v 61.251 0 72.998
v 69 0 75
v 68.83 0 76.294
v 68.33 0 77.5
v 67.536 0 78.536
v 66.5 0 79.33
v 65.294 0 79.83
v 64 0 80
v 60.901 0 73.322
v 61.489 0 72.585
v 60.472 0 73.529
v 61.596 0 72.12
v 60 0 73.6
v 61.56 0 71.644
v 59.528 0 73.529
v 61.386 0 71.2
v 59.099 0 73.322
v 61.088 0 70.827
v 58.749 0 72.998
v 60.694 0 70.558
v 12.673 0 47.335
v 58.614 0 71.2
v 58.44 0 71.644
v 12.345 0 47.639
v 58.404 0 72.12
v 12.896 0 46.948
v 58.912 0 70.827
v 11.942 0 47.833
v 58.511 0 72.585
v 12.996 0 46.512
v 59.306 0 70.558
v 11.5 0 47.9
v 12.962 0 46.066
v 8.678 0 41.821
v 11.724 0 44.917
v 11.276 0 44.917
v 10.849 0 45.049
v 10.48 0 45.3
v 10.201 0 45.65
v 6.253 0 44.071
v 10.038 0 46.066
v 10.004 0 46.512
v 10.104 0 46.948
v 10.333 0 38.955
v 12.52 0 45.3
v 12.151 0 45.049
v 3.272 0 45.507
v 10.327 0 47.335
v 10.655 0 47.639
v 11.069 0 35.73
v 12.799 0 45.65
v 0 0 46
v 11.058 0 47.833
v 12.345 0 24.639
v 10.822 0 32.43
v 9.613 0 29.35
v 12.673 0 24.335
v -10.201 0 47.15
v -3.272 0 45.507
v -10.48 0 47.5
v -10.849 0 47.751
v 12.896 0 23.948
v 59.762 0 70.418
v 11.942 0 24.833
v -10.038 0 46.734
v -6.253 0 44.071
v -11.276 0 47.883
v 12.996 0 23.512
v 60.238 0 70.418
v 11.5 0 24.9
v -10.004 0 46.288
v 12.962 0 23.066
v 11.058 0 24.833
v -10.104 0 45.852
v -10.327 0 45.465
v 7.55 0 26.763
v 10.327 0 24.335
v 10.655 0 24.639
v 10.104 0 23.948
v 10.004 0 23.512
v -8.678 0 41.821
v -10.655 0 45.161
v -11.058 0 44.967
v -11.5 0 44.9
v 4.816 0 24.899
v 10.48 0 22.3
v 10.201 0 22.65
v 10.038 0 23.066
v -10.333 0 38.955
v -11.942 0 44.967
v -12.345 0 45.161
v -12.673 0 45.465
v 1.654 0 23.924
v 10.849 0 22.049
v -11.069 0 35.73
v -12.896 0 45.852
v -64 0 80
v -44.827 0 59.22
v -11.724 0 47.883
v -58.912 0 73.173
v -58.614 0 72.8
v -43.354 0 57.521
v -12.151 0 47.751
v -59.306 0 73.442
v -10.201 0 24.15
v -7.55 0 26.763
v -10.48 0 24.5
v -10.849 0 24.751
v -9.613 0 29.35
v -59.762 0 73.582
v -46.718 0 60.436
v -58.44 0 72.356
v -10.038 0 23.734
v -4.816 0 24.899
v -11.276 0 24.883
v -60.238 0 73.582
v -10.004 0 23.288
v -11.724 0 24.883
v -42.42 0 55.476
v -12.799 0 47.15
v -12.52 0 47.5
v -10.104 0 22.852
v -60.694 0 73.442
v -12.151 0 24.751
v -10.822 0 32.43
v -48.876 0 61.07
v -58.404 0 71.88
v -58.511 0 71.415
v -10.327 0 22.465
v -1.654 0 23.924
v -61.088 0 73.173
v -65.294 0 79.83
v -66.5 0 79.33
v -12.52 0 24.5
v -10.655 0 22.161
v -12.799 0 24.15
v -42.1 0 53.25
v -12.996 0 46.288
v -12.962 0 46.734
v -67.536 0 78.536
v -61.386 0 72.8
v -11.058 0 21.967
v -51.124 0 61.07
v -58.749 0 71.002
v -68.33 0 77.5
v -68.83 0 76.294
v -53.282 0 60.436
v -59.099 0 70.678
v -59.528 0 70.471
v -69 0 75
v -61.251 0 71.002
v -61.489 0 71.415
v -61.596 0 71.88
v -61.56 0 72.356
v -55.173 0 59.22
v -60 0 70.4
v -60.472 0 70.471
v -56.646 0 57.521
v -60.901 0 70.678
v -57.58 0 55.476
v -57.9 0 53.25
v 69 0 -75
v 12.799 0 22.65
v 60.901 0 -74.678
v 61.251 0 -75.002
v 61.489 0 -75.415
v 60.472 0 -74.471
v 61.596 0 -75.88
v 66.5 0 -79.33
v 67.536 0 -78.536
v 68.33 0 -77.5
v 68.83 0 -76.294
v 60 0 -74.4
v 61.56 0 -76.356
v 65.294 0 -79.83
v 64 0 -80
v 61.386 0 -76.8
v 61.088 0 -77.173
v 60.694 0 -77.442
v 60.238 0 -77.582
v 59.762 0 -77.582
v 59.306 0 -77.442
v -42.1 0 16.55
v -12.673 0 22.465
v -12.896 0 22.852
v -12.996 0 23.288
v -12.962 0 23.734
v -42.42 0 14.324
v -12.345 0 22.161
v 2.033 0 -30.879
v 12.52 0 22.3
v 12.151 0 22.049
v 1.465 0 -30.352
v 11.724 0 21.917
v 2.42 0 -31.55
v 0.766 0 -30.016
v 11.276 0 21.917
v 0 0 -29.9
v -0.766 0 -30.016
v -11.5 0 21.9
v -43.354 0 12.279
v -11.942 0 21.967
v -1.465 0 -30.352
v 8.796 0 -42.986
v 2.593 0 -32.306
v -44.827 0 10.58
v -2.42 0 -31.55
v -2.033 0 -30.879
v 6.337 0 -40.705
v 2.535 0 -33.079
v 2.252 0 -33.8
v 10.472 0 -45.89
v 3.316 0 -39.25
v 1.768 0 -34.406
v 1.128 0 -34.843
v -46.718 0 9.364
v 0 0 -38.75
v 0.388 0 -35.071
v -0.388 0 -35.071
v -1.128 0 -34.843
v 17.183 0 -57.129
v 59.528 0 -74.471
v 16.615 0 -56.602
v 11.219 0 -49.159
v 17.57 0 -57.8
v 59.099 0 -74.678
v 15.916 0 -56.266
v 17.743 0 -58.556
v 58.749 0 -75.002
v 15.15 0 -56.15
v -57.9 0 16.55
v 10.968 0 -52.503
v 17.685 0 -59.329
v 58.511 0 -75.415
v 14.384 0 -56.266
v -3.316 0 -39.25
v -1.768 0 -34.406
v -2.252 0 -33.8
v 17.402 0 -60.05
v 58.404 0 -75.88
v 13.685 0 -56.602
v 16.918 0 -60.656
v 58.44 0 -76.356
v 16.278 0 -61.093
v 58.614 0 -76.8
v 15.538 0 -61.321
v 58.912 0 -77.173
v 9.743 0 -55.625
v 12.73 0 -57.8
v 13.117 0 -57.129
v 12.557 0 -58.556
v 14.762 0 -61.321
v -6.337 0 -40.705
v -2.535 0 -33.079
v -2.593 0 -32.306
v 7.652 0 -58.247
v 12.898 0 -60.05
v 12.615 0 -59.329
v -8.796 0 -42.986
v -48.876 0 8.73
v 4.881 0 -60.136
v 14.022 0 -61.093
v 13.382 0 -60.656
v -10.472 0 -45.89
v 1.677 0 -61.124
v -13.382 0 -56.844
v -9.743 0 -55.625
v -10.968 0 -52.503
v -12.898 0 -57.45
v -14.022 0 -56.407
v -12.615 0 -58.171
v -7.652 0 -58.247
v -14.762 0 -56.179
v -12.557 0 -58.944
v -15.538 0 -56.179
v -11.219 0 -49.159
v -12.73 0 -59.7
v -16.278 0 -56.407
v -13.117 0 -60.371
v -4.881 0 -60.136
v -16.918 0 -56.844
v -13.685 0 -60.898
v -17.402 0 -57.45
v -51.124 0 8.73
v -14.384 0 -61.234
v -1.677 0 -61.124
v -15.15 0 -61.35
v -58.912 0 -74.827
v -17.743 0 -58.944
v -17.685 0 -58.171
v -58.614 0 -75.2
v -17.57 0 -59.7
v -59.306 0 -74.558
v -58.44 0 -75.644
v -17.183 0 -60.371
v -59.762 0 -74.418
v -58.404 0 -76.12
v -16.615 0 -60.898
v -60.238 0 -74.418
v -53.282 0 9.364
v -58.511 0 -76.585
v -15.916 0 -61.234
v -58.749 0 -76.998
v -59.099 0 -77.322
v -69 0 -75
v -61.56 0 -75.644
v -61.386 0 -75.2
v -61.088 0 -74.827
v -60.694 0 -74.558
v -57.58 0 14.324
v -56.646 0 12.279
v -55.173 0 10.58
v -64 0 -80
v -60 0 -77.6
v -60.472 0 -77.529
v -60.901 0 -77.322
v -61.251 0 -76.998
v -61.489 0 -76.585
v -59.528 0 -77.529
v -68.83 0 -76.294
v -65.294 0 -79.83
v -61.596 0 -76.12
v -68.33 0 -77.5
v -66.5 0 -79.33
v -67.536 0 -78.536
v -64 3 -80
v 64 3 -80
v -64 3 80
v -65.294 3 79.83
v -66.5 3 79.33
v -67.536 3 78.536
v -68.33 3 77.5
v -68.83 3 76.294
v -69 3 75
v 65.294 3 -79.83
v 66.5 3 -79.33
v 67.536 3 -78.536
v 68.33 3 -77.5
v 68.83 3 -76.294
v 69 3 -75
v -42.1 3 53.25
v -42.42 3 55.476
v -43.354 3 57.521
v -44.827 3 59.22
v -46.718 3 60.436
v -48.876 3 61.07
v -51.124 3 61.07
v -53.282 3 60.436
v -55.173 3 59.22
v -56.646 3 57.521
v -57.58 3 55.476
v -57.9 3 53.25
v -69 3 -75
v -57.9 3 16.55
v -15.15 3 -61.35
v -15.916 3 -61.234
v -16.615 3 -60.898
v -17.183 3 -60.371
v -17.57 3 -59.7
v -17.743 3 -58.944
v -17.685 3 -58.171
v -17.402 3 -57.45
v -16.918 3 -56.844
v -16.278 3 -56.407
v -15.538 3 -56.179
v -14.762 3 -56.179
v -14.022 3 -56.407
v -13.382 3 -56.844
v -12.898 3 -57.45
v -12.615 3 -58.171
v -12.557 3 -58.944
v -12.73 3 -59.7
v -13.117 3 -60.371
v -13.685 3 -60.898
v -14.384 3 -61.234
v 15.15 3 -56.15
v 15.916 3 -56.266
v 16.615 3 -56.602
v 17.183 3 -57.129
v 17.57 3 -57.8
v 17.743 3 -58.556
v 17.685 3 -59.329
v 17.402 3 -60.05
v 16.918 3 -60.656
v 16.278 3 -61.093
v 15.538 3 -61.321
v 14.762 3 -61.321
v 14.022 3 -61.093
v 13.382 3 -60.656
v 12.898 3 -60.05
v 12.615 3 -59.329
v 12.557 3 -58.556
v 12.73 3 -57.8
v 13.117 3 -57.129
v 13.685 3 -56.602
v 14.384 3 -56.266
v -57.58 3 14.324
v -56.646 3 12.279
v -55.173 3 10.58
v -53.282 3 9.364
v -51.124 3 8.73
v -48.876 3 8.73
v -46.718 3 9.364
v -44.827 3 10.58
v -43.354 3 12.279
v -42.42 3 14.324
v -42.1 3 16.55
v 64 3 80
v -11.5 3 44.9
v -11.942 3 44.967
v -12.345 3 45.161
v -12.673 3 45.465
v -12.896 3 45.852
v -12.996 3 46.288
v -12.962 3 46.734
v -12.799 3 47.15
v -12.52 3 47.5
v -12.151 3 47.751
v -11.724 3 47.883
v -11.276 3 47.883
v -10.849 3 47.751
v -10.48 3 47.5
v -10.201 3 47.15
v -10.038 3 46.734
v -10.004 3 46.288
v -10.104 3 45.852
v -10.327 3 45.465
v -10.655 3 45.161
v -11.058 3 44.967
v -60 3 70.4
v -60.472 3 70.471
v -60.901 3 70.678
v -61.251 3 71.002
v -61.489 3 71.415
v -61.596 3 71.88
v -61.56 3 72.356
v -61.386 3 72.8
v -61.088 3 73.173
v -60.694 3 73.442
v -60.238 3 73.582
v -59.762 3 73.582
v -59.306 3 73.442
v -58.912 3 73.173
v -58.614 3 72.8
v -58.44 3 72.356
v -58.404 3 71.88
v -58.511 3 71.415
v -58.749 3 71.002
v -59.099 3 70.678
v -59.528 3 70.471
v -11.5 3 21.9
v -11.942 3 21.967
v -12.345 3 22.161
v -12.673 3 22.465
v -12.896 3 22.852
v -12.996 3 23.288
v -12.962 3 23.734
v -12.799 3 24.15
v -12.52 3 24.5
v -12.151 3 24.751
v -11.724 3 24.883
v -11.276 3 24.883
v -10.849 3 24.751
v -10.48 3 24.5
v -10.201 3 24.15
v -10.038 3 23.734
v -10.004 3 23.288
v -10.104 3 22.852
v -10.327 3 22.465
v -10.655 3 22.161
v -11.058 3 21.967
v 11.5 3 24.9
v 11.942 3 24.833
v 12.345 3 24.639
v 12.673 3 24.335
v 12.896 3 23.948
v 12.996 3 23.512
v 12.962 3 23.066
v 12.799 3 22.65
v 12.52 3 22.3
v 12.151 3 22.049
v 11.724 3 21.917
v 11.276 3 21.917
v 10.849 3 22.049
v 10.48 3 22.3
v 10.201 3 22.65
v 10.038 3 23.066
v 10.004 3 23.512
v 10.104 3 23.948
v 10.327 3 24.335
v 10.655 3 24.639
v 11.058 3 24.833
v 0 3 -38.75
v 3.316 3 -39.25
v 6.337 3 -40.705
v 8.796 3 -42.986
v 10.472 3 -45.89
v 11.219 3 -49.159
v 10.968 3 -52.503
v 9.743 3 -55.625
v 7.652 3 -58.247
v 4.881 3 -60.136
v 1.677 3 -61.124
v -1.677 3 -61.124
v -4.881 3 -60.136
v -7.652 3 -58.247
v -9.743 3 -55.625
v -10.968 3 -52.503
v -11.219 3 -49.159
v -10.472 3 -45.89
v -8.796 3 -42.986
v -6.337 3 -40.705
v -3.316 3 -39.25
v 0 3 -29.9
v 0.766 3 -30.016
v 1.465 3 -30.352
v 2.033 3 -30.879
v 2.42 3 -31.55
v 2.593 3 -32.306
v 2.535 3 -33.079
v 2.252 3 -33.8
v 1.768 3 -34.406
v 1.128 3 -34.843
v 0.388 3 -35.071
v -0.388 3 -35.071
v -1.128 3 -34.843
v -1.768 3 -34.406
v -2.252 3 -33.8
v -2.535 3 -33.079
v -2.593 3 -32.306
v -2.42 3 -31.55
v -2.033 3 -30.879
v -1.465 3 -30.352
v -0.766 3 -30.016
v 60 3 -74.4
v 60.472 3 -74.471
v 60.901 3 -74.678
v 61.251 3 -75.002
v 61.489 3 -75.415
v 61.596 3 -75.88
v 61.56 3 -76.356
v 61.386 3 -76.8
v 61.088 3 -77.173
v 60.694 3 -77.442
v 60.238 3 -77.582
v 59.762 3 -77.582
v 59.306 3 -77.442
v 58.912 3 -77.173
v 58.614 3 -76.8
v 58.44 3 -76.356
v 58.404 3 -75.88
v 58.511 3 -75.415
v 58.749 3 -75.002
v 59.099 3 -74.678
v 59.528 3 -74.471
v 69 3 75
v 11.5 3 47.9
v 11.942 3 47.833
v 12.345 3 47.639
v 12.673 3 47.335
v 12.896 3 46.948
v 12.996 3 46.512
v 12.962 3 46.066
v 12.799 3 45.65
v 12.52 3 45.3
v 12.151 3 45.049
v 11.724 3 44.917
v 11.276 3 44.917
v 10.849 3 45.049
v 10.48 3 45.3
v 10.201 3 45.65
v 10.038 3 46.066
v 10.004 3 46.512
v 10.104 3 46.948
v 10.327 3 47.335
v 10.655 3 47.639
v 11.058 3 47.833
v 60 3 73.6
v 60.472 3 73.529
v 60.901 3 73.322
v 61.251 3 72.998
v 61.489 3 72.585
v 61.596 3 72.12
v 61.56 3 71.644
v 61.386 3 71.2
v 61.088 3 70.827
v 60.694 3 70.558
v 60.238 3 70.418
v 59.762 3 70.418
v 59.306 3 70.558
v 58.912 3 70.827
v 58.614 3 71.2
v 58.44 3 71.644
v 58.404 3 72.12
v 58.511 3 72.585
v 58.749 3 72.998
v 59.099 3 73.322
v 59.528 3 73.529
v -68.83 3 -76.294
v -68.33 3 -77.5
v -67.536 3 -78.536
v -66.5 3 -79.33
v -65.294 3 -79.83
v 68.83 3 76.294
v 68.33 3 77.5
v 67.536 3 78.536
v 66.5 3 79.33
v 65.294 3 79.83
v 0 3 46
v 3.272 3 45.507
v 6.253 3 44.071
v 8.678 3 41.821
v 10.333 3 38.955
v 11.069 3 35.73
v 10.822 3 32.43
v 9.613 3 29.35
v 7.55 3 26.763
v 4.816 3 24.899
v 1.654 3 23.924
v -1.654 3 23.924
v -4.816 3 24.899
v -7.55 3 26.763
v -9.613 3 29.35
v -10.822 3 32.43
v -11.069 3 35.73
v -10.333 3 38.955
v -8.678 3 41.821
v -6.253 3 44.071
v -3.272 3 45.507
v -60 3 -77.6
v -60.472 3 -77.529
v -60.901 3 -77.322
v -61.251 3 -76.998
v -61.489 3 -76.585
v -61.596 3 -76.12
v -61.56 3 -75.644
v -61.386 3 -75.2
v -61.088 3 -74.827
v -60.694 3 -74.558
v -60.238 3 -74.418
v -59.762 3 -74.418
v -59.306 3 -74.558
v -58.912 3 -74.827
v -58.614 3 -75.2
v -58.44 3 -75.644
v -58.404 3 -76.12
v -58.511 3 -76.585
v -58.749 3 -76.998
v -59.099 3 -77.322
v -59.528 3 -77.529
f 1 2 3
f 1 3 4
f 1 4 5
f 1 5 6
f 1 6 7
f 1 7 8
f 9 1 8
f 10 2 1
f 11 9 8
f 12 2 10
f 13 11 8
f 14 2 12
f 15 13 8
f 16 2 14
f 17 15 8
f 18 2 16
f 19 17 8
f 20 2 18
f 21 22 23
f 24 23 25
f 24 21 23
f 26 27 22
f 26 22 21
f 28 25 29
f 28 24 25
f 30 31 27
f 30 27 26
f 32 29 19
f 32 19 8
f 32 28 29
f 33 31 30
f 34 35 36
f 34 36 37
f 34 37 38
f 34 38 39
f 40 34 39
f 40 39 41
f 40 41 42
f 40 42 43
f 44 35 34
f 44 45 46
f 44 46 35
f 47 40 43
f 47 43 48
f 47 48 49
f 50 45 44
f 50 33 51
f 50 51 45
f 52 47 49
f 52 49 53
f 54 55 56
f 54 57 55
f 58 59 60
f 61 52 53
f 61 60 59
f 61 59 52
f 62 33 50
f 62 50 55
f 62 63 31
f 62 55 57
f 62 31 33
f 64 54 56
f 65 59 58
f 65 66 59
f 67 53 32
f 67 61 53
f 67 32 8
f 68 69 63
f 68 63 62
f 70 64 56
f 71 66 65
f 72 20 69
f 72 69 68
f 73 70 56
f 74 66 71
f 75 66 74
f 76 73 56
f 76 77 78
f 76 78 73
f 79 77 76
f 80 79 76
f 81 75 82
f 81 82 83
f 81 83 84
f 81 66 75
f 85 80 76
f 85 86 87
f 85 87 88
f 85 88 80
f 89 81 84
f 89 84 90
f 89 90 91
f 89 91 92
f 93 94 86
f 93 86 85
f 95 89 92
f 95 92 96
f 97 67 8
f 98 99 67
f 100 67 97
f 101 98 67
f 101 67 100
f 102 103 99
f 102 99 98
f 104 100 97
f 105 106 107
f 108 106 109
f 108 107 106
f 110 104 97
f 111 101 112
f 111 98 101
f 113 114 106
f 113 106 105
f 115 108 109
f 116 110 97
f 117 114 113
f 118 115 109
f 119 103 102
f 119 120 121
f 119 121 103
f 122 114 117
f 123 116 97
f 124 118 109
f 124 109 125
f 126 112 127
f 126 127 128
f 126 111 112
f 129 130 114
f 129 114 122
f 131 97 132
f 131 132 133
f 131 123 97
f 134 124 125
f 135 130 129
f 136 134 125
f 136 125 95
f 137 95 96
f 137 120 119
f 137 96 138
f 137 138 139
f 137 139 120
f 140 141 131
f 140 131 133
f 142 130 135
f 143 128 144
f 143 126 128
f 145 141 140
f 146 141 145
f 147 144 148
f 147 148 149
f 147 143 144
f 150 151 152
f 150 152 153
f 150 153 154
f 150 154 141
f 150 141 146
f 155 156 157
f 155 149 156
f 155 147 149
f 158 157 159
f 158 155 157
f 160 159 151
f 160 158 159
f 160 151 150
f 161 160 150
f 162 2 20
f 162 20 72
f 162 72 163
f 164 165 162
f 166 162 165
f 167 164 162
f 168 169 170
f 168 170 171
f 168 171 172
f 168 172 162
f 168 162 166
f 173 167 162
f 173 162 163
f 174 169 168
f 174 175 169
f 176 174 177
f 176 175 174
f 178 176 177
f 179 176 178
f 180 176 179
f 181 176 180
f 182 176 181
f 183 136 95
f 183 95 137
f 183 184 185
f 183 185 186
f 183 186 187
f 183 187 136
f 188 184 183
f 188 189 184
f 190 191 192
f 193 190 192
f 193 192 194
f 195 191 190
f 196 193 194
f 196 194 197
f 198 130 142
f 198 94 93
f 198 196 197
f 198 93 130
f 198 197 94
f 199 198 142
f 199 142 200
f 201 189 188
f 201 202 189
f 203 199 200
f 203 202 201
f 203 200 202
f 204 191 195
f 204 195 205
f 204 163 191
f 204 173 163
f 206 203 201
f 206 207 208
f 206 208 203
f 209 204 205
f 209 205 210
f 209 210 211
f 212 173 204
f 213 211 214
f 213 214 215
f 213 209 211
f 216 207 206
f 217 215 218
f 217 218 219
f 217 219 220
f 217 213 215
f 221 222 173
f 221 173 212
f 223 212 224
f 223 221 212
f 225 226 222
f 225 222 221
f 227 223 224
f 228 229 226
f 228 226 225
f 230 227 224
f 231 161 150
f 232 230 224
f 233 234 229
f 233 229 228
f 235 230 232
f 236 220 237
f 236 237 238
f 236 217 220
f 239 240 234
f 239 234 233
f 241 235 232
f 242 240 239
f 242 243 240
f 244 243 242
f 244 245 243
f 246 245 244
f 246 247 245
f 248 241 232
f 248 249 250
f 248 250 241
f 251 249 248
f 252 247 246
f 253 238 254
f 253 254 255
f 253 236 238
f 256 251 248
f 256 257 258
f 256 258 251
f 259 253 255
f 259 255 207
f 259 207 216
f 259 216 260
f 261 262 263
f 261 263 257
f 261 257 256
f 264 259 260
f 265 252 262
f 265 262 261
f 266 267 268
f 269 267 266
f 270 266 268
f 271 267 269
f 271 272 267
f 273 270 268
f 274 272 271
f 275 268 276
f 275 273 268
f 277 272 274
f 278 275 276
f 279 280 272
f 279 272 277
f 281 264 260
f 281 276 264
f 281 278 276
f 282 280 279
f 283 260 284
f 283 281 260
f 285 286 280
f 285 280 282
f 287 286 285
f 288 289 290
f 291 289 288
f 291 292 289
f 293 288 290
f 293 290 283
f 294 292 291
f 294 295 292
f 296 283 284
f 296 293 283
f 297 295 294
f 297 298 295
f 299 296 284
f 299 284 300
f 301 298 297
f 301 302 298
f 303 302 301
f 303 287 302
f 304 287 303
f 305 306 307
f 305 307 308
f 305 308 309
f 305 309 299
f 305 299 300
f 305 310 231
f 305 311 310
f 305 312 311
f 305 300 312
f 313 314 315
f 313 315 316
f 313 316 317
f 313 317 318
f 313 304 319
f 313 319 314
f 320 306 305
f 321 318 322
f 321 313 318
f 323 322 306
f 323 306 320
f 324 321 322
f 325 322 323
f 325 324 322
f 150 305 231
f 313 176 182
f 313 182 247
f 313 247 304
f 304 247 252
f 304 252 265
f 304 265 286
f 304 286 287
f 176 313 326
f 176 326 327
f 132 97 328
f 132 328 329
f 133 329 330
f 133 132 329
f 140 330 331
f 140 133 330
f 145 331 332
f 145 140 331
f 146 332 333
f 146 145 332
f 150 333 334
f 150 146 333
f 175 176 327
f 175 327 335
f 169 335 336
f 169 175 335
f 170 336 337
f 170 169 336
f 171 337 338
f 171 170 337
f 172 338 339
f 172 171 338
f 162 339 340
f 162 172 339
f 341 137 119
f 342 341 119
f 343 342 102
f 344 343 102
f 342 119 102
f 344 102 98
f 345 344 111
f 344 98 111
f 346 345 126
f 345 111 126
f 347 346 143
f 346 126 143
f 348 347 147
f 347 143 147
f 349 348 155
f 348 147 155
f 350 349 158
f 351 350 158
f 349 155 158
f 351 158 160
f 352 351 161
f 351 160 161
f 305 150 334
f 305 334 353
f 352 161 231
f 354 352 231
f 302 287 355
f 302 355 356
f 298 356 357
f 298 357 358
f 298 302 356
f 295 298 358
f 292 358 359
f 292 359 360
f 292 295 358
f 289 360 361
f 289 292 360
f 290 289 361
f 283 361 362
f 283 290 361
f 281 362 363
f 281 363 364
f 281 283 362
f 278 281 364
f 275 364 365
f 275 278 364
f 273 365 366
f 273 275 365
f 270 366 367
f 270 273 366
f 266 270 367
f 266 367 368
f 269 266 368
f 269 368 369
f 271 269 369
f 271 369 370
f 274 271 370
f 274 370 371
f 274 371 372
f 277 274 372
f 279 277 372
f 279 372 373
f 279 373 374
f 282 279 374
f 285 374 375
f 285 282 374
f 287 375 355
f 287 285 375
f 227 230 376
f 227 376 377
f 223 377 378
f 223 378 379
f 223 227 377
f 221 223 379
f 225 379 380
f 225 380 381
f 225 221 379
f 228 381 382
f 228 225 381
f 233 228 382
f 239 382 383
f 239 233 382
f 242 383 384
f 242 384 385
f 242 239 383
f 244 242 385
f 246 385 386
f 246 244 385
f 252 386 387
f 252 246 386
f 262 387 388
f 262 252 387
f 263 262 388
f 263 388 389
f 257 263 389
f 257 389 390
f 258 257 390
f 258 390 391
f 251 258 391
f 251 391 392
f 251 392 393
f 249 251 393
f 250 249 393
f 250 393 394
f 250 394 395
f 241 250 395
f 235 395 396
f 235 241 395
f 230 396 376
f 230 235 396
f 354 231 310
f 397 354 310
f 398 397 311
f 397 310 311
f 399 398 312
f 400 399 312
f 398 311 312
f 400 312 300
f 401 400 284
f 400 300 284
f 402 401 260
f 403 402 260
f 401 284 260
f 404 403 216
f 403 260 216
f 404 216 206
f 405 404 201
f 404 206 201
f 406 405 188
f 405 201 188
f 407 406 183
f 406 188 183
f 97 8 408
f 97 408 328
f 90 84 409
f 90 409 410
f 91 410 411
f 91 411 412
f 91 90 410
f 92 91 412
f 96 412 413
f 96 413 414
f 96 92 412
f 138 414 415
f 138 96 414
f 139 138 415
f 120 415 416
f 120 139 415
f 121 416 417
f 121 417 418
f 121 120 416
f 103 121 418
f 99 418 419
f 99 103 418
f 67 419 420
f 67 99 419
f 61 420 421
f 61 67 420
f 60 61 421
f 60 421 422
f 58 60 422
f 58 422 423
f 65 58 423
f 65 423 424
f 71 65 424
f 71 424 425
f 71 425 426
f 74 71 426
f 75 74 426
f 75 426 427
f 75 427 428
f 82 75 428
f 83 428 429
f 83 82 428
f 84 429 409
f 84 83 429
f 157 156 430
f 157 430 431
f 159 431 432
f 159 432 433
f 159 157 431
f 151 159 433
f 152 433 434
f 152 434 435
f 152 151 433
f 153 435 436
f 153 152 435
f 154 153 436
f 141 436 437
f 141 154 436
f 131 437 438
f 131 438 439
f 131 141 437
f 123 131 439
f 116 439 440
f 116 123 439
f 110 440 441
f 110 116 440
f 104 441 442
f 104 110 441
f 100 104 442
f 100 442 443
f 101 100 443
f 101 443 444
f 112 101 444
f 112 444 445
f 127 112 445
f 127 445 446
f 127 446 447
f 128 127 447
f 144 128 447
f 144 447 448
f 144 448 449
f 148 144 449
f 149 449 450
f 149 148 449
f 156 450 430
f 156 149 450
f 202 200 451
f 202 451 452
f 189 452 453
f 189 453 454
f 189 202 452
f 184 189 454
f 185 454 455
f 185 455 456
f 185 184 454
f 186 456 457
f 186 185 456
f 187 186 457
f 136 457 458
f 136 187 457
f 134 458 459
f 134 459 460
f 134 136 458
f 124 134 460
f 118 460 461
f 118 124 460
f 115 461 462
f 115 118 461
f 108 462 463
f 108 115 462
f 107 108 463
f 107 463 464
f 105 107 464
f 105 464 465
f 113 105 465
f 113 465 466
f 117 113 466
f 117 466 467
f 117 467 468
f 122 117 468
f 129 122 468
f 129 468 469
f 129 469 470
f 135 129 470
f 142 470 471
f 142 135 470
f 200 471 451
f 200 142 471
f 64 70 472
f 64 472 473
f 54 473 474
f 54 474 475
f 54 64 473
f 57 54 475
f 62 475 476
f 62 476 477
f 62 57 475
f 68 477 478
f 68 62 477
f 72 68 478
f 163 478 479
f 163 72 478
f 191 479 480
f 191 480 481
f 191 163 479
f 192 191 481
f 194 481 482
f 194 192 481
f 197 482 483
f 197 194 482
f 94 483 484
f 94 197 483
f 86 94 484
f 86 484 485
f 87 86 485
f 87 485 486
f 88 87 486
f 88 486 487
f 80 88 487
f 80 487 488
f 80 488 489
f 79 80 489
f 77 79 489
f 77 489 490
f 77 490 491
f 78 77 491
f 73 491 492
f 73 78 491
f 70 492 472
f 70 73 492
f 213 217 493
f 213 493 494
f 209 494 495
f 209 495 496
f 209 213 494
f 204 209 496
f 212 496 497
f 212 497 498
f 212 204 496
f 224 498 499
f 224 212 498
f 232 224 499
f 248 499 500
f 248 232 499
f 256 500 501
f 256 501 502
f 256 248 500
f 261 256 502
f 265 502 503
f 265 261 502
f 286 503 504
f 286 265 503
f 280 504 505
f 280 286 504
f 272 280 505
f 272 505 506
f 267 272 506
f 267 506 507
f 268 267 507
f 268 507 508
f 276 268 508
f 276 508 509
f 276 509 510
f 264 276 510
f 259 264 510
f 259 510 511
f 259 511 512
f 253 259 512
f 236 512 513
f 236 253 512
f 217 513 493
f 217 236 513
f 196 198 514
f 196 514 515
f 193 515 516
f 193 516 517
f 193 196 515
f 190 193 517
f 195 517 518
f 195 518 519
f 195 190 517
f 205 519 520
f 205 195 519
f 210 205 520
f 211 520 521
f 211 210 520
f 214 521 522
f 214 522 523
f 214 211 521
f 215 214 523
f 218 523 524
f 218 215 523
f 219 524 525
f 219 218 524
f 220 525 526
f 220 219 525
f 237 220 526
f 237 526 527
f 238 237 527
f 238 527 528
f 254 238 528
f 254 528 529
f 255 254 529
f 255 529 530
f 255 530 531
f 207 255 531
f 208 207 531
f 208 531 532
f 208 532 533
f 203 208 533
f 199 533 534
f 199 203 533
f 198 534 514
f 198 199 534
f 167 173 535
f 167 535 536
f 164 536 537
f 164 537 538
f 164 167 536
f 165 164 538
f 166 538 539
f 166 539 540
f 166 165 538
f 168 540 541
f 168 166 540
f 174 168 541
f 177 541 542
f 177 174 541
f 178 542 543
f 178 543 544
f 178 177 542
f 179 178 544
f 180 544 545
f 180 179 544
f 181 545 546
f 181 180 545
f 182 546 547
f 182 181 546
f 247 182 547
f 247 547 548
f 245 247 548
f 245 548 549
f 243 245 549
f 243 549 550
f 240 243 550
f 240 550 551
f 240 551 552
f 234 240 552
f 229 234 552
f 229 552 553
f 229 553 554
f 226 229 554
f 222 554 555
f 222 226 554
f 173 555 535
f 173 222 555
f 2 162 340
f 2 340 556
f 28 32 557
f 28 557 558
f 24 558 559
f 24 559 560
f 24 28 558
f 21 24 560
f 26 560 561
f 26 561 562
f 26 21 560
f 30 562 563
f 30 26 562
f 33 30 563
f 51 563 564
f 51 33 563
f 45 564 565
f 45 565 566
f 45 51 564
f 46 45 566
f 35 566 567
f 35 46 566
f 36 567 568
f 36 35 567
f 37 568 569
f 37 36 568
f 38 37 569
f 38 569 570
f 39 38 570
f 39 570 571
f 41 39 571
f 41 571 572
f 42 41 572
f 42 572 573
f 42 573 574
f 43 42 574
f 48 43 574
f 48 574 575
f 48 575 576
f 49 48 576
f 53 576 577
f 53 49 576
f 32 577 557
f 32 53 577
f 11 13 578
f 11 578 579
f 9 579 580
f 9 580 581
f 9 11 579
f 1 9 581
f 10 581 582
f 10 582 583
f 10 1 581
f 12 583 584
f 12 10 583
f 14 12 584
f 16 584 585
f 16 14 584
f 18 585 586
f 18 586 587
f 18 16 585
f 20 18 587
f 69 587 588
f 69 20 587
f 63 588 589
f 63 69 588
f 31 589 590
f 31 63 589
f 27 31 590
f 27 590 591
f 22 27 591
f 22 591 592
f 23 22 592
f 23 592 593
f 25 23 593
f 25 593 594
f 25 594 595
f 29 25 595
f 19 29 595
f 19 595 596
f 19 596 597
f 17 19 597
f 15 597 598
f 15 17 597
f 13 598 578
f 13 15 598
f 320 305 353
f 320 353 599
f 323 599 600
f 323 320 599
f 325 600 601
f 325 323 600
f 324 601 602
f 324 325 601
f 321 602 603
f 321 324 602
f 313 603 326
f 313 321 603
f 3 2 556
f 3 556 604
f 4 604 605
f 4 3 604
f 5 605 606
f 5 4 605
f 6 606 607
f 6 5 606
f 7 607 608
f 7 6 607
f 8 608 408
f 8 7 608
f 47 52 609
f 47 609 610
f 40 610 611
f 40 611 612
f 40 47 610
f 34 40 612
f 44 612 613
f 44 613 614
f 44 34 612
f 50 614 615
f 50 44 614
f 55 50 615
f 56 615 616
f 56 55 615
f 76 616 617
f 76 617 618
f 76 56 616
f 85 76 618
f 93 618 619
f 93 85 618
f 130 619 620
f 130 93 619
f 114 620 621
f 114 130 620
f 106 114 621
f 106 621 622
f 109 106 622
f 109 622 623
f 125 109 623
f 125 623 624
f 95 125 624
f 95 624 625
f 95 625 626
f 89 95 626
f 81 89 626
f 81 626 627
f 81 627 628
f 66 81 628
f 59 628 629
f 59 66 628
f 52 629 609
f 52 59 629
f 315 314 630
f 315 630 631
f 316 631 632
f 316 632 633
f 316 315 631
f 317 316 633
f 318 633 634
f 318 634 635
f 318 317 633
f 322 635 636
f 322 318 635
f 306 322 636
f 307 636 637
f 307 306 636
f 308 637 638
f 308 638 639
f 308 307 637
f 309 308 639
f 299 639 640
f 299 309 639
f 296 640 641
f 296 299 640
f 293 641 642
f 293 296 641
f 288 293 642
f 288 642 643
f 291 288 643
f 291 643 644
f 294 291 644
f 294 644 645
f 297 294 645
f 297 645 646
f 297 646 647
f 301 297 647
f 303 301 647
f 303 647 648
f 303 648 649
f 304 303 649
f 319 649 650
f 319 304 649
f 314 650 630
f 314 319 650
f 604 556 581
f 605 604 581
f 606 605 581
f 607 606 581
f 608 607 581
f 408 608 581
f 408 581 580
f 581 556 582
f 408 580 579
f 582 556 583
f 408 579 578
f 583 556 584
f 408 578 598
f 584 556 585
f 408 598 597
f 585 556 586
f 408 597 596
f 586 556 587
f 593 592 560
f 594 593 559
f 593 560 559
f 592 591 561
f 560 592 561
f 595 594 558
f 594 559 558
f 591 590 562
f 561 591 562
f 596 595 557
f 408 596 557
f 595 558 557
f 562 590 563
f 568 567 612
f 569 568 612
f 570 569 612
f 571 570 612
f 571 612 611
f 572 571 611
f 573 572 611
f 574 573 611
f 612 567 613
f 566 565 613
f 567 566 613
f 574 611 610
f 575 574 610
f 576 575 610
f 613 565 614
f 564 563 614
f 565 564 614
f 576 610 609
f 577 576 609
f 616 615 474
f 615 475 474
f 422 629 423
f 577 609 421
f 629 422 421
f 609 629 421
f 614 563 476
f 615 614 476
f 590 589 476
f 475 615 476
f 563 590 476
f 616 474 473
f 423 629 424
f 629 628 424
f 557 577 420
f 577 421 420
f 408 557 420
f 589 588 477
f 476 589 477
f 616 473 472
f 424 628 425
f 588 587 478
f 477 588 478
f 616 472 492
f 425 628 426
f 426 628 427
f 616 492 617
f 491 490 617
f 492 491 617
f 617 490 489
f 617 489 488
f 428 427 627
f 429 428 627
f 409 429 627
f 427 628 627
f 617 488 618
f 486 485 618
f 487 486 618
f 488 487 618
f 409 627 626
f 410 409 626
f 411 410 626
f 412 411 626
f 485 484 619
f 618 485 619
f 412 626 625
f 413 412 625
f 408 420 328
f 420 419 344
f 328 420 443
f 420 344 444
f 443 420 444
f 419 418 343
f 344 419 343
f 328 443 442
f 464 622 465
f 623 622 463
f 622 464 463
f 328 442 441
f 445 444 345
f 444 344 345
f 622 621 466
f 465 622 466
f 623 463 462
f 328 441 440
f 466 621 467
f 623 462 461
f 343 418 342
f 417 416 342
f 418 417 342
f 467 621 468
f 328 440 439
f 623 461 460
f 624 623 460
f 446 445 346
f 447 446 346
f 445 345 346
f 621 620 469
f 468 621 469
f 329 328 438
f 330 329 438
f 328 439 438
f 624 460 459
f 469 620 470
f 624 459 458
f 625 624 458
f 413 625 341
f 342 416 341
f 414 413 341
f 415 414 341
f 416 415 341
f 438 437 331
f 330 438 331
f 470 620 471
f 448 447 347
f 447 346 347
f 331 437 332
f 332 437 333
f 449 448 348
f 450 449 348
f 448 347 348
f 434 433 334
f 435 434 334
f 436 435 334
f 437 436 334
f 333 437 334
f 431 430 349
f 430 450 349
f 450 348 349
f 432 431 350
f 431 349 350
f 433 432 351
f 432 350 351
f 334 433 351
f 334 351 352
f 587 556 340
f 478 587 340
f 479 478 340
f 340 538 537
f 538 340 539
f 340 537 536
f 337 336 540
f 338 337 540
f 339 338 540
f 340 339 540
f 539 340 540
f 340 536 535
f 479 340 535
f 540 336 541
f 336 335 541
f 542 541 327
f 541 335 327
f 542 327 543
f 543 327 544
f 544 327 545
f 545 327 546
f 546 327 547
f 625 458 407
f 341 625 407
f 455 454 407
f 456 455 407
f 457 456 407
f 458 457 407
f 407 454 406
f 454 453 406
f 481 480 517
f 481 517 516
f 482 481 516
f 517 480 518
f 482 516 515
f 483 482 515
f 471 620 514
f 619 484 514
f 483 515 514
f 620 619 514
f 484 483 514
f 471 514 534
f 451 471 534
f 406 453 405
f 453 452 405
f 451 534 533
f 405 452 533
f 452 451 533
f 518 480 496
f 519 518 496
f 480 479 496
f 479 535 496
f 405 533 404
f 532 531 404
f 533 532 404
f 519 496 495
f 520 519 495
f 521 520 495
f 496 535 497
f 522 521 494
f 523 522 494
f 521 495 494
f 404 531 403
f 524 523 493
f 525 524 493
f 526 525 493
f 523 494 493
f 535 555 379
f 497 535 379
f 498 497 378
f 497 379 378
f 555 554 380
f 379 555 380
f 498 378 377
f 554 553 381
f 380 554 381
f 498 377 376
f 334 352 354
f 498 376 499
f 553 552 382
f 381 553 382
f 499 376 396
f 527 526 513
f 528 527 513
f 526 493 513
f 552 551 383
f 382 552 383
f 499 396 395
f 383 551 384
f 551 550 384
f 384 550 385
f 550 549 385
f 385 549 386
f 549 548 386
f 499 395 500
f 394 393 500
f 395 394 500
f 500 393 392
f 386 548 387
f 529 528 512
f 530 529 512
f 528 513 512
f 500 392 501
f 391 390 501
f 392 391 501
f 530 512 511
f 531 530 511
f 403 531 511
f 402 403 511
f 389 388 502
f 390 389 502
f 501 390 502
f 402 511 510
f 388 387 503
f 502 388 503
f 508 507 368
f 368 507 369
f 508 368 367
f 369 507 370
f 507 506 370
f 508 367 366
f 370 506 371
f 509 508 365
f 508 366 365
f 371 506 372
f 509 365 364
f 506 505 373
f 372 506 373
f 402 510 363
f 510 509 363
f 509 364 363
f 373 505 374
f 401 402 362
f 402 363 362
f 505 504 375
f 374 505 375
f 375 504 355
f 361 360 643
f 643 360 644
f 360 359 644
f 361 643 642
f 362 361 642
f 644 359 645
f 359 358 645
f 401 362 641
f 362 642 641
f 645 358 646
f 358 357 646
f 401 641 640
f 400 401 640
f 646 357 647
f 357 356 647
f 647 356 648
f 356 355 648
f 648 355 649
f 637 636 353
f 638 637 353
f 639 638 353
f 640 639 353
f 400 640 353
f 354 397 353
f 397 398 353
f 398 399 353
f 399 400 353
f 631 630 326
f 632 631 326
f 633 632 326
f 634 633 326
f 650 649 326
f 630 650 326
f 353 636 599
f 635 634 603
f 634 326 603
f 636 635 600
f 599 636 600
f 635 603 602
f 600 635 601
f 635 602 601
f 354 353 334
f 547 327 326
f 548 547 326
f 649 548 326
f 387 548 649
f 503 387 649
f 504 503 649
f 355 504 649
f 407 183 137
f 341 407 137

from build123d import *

# Parameters (mm, degrees)
SKETCH_1_R      = 1.6
SKETCH_1_R_2    = 11.1
SKETCH_1_R_3    = 1.5
SKETCH_1_R_4    = 11.25
SKETCH_1_R_5    = 2.6
EXTRUDE_1_DEPTH = 3


with BuildPart() as part:
    # 草图1 → 凸台-拉伸1 (new body)
    with BuildSketch(Plane(origin=(0, 0, 0), x_dir=(1, 0, 0), z_dir=(0, 1, 0))):
        with BuildLine():
            Line((64, -80), (-64, -80))
            ThreePointArc((-64, -80), (-67.535533906, -78.535533906), (-69, -75))
            Line((-69, -75), (-69, 75))
            ThreePointArc((-69, 75), (-67.535533906, 78.535533906), (-64, 80))
            Line((-64, 80), (64, 80))
            ThreePointArc((64, 80), (67.535533906, 78.535533906), (69, 75))
            Line((69, 75), (69, -75))
            ThreePointArc((69, -75), (67.535533906, -78.535533906), (64, -80))
        make_face()
        with Locations(Location((60, 76, 0), (0, 0, 270))):
            Circle(SKETCH_1_R, mode=Mode.SUBTRACT)
        with Locations(Location((-60, 76, 0), (0, 0, 90))):
            Circle(SKETCH_1_R, mode=Mode.SUBTRACT)
        with Locations(Location((0, -34.9, 0), (0, 0, 270))):
            Circle(SKETCH_1_R_2, mode=Mode.SUBTRACT)
        with Locations(Location((11.5, -46.4, 0), (0, 0, 270))):
            Circle(SKETCH_1_R_3, mode=Mode.SUBTRACT)
        with Locations(Location((11.5, -23.4, 0), (0, 0, 270))):
            Circle(SKETCH_1_R_3, mode=Mode.SUBTRACT)
        with Locations(Location((-11.5, -46.4, 0), (0, 0, 90))):
            Circle(SKETCH_1_R_3, mode=Mode.SUBTRACT)
        with Locations(Location((-11.5, -23.4, 0), (0, 0, 90))):
            Circle(SKETCH_1_R_3, mode=Mode.SUBTRACT)
        with Locations(Location((0, 50, 0), (0, 0, 270))):
            Circle(SKETCH_1_R_4, mode=Mode.SUBTRACT)
        with Locations(Location((60, -72, 0), (0, 0, 270))):
            Circle(SKETCH_1_R, mode=Mode.SUBTRACT)
        with Locations(Location((-60, -72, 0), (0, 0, 90))):
            Circle(SKETCH_1_R, mode=Mode.SUBTRACT)
        with Locations(Location((0, 32.5, 0), (0, 0, 270))):
            Circle(SKETCH_1_R_5, mode=Mode.SUBTRACT)
        with Locations(Location((15.15, 58.75, 0), (0, 0, 270))):
            Circle(SKETCH_1_R_5, mode=Mode.SUBTRACT)
        with Locations(Location((-15.15, 58.75, 0), (0, 0, 90))):
            Circle(SKETCH_1_R_5, mode=Mode.SUBTRACT)
        with BuildLine():
            Line((-42.1, -16.55), (-42.1, -53.25))
            ThreePointArc((-42.1, -53.25), (-50, -61.15), (-57.9, -53.25))
            Line((-57.9, -53.25), (-57.9, -16.55))
            ThreePointArc((-57.9, -16.55), (-50, -8.65), (-42.1, -16.55))
        make_face(mode=Mode.SUBTRACT)
    extrude(amount=EXTRUDE_1_DEPTH)


solid = part.part
